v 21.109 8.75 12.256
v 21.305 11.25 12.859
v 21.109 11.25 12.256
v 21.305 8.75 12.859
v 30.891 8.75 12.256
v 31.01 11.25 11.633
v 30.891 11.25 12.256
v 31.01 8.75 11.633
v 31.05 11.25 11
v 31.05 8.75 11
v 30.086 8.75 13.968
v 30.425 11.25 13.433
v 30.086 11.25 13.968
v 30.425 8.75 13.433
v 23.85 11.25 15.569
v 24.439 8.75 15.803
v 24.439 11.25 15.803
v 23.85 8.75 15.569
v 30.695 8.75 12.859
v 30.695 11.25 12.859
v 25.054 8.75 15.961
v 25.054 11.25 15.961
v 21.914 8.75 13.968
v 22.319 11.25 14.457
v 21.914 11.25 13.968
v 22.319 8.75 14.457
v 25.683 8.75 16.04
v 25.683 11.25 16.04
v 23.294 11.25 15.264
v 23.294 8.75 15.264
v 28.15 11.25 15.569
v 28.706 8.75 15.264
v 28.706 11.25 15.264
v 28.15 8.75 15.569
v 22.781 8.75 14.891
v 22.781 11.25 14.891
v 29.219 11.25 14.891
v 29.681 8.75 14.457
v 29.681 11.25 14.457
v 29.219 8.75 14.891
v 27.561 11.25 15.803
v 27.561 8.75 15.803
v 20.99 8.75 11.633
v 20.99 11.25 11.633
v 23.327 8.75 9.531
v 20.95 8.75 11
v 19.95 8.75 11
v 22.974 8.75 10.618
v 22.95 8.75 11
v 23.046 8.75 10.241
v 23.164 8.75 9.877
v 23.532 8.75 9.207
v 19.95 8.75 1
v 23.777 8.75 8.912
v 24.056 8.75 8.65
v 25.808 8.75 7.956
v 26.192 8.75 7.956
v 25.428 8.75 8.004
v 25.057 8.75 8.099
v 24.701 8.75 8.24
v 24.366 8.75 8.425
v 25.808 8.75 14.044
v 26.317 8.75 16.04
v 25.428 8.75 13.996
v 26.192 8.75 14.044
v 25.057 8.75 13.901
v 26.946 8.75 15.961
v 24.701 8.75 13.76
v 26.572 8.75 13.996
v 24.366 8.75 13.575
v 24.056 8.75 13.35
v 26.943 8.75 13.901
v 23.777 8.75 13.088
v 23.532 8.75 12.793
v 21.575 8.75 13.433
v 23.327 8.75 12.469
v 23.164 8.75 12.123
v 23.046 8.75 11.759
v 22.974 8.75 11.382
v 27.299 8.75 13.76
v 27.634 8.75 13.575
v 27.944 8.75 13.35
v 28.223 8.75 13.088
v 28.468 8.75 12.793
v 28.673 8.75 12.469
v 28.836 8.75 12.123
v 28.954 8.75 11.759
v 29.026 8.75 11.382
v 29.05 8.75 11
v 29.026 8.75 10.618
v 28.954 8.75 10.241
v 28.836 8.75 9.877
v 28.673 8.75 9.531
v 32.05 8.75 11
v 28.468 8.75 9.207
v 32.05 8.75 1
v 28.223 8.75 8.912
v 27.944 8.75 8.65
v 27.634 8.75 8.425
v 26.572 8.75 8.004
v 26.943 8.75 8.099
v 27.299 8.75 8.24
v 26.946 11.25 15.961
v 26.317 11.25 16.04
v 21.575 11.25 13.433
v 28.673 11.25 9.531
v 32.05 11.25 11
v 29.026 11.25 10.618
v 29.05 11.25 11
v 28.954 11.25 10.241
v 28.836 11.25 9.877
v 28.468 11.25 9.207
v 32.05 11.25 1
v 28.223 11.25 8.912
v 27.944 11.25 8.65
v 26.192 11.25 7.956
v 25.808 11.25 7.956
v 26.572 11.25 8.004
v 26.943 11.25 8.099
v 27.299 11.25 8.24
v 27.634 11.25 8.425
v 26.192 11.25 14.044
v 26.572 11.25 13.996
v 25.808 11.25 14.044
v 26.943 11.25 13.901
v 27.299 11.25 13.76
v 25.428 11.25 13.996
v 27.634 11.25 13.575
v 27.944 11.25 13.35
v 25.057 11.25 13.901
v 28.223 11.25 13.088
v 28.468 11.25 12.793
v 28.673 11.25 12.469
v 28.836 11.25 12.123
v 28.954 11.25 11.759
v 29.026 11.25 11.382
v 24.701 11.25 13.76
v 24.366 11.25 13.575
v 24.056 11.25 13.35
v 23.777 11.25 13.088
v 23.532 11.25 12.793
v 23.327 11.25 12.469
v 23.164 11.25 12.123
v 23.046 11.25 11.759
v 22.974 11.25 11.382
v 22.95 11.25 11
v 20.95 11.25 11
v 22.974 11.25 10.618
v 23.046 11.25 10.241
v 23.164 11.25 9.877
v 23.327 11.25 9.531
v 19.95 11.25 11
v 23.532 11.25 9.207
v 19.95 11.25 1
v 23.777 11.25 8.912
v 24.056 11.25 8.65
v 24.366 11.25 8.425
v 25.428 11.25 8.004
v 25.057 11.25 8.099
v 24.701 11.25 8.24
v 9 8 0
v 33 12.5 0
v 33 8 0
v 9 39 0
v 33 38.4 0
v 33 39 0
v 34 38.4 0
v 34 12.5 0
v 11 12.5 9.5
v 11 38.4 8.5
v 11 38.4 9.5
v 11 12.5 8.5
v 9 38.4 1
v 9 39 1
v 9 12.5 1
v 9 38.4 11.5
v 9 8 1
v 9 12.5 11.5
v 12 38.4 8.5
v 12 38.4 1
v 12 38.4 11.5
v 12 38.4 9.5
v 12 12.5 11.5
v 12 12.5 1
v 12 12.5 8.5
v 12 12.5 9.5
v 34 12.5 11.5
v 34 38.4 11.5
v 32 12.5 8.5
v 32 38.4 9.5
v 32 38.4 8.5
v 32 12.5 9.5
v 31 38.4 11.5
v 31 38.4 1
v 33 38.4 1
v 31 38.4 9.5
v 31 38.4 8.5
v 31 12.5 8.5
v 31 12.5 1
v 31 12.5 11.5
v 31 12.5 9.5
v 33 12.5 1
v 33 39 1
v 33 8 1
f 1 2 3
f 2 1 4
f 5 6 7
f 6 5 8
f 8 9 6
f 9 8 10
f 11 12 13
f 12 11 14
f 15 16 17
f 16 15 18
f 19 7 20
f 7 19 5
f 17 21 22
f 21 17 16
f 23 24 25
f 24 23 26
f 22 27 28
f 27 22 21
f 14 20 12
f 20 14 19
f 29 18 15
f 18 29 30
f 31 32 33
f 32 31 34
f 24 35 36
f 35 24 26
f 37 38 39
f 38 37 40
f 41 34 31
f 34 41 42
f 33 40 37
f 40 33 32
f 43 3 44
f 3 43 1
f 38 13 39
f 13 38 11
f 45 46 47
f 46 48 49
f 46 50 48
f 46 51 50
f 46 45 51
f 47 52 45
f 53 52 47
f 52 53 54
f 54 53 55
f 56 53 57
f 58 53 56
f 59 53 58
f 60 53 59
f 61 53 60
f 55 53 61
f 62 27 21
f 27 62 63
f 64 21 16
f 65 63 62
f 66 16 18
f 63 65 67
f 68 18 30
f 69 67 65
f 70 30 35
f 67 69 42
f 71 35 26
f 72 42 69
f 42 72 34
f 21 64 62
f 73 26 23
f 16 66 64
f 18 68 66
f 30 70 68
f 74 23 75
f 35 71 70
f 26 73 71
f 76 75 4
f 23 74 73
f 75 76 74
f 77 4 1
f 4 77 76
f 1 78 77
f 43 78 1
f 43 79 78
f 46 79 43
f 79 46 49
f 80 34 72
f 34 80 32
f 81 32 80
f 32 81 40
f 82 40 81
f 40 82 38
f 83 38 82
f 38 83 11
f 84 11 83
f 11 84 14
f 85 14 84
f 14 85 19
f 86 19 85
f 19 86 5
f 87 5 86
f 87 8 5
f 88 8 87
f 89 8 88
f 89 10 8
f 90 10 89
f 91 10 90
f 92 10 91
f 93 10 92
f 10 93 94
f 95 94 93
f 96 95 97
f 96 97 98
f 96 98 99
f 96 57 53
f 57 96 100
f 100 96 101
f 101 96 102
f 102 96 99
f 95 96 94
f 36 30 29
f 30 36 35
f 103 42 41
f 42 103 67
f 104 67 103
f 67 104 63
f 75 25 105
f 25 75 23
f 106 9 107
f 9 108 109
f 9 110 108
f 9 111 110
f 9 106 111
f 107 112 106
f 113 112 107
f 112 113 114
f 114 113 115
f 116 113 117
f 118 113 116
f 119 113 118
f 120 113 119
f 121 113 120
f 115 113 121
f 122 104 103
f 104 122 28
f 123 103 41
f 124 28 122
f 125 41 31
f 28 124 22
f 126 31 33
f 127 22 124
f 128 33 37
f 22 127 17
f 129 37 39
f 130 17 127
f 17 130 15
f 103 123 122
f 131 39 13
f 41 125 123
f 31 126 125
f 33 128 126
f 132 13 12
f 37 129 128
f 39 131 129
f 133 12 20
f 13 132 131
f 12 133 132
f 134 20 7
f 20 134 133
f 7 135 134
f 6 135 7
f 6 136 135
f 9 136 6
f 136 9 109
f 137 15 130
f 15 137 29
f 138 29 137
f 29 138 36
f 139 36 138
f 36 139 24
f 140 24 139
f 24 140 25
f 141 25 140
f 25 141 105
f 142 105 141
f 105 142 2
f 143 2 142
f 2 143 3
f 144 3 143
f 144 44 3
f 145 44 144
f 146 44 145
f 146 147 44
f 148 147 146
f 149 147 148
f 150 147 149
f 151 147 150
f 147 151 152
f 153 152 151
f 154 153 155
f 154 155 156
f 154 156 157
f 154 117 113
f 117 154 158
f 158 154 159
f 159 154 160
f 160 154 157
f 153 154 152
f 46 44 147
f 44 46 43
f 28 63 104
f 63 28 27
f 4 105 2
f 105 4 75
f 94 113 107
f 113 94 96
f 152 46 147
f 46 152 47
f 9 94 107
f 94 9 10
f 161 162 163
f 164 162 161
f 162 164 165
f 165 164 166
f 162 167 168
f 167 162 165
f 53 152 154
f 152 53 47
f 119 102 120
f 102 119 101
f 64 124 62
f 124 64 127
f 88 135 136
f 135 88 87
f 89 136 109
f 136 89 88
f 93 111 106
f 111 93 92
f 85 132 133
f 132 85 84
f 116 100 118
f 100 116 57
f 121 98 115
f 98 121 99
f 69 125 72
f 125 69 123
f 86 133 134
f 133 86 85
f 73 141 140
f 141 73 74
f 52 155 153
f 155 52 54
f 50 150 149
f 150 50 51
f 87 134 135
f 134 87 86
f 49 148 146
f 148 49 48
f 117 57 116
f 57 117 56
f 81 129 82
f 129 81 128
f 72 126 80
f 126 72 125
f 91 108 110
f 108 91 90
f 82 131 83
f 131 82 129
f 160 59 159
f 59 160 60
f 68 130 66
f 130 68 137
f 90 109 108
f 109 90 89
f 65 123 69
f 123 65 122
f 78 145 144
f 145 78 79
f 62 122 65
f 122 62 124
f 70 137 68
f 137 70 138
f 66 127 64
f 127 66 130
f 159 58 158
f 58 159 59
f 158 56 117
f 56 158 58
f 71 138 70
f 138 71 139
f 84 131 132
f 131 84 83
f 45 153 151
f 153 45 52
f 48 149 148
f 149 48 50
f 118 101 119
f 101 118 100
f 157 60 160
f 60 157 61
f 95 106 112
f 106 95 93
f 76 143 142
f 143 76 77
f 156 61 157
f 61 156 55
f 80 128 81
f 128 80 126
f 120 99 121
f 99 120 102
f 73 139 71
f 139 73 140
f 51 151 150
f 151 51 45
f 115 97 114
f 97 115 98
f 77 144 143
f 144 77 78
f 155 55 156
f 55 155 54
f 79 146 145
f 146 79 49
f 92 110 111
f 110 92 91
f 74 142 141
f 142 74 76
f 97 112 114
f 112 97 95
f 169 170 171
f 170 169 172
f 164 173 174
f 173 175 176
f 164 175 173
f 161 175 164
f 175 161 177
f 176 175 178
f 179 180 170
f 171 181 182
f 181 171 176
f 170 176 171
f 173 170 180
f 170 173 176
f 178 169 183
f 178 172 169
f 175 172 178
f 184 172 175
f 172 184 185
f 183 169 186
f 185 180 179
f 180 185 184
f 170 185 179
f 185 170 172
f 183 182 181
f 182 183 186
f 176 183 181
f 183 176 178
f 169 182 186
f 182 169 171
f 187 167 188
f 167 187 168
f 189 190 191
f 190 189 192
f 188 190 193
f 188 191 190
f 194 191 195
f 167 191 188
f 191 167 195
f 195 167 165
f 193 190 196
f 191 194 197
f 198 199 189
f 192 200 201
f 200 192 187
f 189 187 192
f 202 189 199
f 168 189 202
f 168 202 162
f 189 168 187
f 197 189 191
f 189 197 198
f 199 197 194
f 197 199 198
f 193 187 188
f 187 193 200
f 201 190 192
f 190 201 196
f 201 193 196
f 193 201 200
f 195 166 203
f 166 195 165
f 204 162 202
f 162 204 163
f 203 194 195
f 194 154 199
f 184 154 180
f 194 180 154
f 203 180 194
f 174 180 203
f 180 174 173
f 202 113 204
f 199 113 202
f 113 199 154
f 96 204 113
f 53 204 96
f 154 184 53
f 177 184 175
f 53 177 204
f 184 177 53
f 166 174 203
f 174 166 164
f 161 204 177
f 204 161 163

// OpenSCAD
$fn=50;

bottomHeight = 1;

cylinderHolderHeight = 2.5;
cylinderHolderDiameterInner = 6.1;
cylinderHolderDiameterOuter = cylinderHolderDiameterInner + 4;
cylinderHolderBottomGap = bottomHeight + 10;
boardBottomGap = cylinderHolderBottomGap - 2.5;

translate([9, 8, 0]) cube([24, 31, 1]);

translate([26, 10, cylinderHolderBottomGap]) {
    difference() {
        union() {
            rotate([90, 0, 0]) cylinder(cylinderHolderHeight, d1 = cylinderHolderDiameterOuter, d2 = cylinderHolderDiameterOuter, center=true);
            translate([0, 0, (cylinderHolderBottomGap / 2) - cylinderHolderBottomGap]) cube([cylinderHolderDiameterOuter + 2, cylinderHolderHeight, cylinderHolderBottomGap ], center = true);
        }
        rotate([90, 0, 0]) cylinder(cylinderHolderHeight + 1, d1=cylinderHolderDiameterInner, d2=cylinderHolderDiameterInner, center=true);
    }
}

translate([9, 12.5, 0]) {
    union() {
        cube([2, 25.9, boardBottomGap + 2]);
        cube([3, 25.9, boardBottomGap]);
        translate([0, 0, boardBottomGap + 1]) cube([3, 25.9, 2]);
    }
}

translate([31, 12.5, 0]) {
    union() {
        translate([1, 0, 0]) cube([2, 25.9, boardBottomGap + 2]);
        cube([3, 25.9, boardBottomGap]);
        translate([0, 0, boardBottomGap + 1]) cube([3, 25.9, 2]);
    }
}
